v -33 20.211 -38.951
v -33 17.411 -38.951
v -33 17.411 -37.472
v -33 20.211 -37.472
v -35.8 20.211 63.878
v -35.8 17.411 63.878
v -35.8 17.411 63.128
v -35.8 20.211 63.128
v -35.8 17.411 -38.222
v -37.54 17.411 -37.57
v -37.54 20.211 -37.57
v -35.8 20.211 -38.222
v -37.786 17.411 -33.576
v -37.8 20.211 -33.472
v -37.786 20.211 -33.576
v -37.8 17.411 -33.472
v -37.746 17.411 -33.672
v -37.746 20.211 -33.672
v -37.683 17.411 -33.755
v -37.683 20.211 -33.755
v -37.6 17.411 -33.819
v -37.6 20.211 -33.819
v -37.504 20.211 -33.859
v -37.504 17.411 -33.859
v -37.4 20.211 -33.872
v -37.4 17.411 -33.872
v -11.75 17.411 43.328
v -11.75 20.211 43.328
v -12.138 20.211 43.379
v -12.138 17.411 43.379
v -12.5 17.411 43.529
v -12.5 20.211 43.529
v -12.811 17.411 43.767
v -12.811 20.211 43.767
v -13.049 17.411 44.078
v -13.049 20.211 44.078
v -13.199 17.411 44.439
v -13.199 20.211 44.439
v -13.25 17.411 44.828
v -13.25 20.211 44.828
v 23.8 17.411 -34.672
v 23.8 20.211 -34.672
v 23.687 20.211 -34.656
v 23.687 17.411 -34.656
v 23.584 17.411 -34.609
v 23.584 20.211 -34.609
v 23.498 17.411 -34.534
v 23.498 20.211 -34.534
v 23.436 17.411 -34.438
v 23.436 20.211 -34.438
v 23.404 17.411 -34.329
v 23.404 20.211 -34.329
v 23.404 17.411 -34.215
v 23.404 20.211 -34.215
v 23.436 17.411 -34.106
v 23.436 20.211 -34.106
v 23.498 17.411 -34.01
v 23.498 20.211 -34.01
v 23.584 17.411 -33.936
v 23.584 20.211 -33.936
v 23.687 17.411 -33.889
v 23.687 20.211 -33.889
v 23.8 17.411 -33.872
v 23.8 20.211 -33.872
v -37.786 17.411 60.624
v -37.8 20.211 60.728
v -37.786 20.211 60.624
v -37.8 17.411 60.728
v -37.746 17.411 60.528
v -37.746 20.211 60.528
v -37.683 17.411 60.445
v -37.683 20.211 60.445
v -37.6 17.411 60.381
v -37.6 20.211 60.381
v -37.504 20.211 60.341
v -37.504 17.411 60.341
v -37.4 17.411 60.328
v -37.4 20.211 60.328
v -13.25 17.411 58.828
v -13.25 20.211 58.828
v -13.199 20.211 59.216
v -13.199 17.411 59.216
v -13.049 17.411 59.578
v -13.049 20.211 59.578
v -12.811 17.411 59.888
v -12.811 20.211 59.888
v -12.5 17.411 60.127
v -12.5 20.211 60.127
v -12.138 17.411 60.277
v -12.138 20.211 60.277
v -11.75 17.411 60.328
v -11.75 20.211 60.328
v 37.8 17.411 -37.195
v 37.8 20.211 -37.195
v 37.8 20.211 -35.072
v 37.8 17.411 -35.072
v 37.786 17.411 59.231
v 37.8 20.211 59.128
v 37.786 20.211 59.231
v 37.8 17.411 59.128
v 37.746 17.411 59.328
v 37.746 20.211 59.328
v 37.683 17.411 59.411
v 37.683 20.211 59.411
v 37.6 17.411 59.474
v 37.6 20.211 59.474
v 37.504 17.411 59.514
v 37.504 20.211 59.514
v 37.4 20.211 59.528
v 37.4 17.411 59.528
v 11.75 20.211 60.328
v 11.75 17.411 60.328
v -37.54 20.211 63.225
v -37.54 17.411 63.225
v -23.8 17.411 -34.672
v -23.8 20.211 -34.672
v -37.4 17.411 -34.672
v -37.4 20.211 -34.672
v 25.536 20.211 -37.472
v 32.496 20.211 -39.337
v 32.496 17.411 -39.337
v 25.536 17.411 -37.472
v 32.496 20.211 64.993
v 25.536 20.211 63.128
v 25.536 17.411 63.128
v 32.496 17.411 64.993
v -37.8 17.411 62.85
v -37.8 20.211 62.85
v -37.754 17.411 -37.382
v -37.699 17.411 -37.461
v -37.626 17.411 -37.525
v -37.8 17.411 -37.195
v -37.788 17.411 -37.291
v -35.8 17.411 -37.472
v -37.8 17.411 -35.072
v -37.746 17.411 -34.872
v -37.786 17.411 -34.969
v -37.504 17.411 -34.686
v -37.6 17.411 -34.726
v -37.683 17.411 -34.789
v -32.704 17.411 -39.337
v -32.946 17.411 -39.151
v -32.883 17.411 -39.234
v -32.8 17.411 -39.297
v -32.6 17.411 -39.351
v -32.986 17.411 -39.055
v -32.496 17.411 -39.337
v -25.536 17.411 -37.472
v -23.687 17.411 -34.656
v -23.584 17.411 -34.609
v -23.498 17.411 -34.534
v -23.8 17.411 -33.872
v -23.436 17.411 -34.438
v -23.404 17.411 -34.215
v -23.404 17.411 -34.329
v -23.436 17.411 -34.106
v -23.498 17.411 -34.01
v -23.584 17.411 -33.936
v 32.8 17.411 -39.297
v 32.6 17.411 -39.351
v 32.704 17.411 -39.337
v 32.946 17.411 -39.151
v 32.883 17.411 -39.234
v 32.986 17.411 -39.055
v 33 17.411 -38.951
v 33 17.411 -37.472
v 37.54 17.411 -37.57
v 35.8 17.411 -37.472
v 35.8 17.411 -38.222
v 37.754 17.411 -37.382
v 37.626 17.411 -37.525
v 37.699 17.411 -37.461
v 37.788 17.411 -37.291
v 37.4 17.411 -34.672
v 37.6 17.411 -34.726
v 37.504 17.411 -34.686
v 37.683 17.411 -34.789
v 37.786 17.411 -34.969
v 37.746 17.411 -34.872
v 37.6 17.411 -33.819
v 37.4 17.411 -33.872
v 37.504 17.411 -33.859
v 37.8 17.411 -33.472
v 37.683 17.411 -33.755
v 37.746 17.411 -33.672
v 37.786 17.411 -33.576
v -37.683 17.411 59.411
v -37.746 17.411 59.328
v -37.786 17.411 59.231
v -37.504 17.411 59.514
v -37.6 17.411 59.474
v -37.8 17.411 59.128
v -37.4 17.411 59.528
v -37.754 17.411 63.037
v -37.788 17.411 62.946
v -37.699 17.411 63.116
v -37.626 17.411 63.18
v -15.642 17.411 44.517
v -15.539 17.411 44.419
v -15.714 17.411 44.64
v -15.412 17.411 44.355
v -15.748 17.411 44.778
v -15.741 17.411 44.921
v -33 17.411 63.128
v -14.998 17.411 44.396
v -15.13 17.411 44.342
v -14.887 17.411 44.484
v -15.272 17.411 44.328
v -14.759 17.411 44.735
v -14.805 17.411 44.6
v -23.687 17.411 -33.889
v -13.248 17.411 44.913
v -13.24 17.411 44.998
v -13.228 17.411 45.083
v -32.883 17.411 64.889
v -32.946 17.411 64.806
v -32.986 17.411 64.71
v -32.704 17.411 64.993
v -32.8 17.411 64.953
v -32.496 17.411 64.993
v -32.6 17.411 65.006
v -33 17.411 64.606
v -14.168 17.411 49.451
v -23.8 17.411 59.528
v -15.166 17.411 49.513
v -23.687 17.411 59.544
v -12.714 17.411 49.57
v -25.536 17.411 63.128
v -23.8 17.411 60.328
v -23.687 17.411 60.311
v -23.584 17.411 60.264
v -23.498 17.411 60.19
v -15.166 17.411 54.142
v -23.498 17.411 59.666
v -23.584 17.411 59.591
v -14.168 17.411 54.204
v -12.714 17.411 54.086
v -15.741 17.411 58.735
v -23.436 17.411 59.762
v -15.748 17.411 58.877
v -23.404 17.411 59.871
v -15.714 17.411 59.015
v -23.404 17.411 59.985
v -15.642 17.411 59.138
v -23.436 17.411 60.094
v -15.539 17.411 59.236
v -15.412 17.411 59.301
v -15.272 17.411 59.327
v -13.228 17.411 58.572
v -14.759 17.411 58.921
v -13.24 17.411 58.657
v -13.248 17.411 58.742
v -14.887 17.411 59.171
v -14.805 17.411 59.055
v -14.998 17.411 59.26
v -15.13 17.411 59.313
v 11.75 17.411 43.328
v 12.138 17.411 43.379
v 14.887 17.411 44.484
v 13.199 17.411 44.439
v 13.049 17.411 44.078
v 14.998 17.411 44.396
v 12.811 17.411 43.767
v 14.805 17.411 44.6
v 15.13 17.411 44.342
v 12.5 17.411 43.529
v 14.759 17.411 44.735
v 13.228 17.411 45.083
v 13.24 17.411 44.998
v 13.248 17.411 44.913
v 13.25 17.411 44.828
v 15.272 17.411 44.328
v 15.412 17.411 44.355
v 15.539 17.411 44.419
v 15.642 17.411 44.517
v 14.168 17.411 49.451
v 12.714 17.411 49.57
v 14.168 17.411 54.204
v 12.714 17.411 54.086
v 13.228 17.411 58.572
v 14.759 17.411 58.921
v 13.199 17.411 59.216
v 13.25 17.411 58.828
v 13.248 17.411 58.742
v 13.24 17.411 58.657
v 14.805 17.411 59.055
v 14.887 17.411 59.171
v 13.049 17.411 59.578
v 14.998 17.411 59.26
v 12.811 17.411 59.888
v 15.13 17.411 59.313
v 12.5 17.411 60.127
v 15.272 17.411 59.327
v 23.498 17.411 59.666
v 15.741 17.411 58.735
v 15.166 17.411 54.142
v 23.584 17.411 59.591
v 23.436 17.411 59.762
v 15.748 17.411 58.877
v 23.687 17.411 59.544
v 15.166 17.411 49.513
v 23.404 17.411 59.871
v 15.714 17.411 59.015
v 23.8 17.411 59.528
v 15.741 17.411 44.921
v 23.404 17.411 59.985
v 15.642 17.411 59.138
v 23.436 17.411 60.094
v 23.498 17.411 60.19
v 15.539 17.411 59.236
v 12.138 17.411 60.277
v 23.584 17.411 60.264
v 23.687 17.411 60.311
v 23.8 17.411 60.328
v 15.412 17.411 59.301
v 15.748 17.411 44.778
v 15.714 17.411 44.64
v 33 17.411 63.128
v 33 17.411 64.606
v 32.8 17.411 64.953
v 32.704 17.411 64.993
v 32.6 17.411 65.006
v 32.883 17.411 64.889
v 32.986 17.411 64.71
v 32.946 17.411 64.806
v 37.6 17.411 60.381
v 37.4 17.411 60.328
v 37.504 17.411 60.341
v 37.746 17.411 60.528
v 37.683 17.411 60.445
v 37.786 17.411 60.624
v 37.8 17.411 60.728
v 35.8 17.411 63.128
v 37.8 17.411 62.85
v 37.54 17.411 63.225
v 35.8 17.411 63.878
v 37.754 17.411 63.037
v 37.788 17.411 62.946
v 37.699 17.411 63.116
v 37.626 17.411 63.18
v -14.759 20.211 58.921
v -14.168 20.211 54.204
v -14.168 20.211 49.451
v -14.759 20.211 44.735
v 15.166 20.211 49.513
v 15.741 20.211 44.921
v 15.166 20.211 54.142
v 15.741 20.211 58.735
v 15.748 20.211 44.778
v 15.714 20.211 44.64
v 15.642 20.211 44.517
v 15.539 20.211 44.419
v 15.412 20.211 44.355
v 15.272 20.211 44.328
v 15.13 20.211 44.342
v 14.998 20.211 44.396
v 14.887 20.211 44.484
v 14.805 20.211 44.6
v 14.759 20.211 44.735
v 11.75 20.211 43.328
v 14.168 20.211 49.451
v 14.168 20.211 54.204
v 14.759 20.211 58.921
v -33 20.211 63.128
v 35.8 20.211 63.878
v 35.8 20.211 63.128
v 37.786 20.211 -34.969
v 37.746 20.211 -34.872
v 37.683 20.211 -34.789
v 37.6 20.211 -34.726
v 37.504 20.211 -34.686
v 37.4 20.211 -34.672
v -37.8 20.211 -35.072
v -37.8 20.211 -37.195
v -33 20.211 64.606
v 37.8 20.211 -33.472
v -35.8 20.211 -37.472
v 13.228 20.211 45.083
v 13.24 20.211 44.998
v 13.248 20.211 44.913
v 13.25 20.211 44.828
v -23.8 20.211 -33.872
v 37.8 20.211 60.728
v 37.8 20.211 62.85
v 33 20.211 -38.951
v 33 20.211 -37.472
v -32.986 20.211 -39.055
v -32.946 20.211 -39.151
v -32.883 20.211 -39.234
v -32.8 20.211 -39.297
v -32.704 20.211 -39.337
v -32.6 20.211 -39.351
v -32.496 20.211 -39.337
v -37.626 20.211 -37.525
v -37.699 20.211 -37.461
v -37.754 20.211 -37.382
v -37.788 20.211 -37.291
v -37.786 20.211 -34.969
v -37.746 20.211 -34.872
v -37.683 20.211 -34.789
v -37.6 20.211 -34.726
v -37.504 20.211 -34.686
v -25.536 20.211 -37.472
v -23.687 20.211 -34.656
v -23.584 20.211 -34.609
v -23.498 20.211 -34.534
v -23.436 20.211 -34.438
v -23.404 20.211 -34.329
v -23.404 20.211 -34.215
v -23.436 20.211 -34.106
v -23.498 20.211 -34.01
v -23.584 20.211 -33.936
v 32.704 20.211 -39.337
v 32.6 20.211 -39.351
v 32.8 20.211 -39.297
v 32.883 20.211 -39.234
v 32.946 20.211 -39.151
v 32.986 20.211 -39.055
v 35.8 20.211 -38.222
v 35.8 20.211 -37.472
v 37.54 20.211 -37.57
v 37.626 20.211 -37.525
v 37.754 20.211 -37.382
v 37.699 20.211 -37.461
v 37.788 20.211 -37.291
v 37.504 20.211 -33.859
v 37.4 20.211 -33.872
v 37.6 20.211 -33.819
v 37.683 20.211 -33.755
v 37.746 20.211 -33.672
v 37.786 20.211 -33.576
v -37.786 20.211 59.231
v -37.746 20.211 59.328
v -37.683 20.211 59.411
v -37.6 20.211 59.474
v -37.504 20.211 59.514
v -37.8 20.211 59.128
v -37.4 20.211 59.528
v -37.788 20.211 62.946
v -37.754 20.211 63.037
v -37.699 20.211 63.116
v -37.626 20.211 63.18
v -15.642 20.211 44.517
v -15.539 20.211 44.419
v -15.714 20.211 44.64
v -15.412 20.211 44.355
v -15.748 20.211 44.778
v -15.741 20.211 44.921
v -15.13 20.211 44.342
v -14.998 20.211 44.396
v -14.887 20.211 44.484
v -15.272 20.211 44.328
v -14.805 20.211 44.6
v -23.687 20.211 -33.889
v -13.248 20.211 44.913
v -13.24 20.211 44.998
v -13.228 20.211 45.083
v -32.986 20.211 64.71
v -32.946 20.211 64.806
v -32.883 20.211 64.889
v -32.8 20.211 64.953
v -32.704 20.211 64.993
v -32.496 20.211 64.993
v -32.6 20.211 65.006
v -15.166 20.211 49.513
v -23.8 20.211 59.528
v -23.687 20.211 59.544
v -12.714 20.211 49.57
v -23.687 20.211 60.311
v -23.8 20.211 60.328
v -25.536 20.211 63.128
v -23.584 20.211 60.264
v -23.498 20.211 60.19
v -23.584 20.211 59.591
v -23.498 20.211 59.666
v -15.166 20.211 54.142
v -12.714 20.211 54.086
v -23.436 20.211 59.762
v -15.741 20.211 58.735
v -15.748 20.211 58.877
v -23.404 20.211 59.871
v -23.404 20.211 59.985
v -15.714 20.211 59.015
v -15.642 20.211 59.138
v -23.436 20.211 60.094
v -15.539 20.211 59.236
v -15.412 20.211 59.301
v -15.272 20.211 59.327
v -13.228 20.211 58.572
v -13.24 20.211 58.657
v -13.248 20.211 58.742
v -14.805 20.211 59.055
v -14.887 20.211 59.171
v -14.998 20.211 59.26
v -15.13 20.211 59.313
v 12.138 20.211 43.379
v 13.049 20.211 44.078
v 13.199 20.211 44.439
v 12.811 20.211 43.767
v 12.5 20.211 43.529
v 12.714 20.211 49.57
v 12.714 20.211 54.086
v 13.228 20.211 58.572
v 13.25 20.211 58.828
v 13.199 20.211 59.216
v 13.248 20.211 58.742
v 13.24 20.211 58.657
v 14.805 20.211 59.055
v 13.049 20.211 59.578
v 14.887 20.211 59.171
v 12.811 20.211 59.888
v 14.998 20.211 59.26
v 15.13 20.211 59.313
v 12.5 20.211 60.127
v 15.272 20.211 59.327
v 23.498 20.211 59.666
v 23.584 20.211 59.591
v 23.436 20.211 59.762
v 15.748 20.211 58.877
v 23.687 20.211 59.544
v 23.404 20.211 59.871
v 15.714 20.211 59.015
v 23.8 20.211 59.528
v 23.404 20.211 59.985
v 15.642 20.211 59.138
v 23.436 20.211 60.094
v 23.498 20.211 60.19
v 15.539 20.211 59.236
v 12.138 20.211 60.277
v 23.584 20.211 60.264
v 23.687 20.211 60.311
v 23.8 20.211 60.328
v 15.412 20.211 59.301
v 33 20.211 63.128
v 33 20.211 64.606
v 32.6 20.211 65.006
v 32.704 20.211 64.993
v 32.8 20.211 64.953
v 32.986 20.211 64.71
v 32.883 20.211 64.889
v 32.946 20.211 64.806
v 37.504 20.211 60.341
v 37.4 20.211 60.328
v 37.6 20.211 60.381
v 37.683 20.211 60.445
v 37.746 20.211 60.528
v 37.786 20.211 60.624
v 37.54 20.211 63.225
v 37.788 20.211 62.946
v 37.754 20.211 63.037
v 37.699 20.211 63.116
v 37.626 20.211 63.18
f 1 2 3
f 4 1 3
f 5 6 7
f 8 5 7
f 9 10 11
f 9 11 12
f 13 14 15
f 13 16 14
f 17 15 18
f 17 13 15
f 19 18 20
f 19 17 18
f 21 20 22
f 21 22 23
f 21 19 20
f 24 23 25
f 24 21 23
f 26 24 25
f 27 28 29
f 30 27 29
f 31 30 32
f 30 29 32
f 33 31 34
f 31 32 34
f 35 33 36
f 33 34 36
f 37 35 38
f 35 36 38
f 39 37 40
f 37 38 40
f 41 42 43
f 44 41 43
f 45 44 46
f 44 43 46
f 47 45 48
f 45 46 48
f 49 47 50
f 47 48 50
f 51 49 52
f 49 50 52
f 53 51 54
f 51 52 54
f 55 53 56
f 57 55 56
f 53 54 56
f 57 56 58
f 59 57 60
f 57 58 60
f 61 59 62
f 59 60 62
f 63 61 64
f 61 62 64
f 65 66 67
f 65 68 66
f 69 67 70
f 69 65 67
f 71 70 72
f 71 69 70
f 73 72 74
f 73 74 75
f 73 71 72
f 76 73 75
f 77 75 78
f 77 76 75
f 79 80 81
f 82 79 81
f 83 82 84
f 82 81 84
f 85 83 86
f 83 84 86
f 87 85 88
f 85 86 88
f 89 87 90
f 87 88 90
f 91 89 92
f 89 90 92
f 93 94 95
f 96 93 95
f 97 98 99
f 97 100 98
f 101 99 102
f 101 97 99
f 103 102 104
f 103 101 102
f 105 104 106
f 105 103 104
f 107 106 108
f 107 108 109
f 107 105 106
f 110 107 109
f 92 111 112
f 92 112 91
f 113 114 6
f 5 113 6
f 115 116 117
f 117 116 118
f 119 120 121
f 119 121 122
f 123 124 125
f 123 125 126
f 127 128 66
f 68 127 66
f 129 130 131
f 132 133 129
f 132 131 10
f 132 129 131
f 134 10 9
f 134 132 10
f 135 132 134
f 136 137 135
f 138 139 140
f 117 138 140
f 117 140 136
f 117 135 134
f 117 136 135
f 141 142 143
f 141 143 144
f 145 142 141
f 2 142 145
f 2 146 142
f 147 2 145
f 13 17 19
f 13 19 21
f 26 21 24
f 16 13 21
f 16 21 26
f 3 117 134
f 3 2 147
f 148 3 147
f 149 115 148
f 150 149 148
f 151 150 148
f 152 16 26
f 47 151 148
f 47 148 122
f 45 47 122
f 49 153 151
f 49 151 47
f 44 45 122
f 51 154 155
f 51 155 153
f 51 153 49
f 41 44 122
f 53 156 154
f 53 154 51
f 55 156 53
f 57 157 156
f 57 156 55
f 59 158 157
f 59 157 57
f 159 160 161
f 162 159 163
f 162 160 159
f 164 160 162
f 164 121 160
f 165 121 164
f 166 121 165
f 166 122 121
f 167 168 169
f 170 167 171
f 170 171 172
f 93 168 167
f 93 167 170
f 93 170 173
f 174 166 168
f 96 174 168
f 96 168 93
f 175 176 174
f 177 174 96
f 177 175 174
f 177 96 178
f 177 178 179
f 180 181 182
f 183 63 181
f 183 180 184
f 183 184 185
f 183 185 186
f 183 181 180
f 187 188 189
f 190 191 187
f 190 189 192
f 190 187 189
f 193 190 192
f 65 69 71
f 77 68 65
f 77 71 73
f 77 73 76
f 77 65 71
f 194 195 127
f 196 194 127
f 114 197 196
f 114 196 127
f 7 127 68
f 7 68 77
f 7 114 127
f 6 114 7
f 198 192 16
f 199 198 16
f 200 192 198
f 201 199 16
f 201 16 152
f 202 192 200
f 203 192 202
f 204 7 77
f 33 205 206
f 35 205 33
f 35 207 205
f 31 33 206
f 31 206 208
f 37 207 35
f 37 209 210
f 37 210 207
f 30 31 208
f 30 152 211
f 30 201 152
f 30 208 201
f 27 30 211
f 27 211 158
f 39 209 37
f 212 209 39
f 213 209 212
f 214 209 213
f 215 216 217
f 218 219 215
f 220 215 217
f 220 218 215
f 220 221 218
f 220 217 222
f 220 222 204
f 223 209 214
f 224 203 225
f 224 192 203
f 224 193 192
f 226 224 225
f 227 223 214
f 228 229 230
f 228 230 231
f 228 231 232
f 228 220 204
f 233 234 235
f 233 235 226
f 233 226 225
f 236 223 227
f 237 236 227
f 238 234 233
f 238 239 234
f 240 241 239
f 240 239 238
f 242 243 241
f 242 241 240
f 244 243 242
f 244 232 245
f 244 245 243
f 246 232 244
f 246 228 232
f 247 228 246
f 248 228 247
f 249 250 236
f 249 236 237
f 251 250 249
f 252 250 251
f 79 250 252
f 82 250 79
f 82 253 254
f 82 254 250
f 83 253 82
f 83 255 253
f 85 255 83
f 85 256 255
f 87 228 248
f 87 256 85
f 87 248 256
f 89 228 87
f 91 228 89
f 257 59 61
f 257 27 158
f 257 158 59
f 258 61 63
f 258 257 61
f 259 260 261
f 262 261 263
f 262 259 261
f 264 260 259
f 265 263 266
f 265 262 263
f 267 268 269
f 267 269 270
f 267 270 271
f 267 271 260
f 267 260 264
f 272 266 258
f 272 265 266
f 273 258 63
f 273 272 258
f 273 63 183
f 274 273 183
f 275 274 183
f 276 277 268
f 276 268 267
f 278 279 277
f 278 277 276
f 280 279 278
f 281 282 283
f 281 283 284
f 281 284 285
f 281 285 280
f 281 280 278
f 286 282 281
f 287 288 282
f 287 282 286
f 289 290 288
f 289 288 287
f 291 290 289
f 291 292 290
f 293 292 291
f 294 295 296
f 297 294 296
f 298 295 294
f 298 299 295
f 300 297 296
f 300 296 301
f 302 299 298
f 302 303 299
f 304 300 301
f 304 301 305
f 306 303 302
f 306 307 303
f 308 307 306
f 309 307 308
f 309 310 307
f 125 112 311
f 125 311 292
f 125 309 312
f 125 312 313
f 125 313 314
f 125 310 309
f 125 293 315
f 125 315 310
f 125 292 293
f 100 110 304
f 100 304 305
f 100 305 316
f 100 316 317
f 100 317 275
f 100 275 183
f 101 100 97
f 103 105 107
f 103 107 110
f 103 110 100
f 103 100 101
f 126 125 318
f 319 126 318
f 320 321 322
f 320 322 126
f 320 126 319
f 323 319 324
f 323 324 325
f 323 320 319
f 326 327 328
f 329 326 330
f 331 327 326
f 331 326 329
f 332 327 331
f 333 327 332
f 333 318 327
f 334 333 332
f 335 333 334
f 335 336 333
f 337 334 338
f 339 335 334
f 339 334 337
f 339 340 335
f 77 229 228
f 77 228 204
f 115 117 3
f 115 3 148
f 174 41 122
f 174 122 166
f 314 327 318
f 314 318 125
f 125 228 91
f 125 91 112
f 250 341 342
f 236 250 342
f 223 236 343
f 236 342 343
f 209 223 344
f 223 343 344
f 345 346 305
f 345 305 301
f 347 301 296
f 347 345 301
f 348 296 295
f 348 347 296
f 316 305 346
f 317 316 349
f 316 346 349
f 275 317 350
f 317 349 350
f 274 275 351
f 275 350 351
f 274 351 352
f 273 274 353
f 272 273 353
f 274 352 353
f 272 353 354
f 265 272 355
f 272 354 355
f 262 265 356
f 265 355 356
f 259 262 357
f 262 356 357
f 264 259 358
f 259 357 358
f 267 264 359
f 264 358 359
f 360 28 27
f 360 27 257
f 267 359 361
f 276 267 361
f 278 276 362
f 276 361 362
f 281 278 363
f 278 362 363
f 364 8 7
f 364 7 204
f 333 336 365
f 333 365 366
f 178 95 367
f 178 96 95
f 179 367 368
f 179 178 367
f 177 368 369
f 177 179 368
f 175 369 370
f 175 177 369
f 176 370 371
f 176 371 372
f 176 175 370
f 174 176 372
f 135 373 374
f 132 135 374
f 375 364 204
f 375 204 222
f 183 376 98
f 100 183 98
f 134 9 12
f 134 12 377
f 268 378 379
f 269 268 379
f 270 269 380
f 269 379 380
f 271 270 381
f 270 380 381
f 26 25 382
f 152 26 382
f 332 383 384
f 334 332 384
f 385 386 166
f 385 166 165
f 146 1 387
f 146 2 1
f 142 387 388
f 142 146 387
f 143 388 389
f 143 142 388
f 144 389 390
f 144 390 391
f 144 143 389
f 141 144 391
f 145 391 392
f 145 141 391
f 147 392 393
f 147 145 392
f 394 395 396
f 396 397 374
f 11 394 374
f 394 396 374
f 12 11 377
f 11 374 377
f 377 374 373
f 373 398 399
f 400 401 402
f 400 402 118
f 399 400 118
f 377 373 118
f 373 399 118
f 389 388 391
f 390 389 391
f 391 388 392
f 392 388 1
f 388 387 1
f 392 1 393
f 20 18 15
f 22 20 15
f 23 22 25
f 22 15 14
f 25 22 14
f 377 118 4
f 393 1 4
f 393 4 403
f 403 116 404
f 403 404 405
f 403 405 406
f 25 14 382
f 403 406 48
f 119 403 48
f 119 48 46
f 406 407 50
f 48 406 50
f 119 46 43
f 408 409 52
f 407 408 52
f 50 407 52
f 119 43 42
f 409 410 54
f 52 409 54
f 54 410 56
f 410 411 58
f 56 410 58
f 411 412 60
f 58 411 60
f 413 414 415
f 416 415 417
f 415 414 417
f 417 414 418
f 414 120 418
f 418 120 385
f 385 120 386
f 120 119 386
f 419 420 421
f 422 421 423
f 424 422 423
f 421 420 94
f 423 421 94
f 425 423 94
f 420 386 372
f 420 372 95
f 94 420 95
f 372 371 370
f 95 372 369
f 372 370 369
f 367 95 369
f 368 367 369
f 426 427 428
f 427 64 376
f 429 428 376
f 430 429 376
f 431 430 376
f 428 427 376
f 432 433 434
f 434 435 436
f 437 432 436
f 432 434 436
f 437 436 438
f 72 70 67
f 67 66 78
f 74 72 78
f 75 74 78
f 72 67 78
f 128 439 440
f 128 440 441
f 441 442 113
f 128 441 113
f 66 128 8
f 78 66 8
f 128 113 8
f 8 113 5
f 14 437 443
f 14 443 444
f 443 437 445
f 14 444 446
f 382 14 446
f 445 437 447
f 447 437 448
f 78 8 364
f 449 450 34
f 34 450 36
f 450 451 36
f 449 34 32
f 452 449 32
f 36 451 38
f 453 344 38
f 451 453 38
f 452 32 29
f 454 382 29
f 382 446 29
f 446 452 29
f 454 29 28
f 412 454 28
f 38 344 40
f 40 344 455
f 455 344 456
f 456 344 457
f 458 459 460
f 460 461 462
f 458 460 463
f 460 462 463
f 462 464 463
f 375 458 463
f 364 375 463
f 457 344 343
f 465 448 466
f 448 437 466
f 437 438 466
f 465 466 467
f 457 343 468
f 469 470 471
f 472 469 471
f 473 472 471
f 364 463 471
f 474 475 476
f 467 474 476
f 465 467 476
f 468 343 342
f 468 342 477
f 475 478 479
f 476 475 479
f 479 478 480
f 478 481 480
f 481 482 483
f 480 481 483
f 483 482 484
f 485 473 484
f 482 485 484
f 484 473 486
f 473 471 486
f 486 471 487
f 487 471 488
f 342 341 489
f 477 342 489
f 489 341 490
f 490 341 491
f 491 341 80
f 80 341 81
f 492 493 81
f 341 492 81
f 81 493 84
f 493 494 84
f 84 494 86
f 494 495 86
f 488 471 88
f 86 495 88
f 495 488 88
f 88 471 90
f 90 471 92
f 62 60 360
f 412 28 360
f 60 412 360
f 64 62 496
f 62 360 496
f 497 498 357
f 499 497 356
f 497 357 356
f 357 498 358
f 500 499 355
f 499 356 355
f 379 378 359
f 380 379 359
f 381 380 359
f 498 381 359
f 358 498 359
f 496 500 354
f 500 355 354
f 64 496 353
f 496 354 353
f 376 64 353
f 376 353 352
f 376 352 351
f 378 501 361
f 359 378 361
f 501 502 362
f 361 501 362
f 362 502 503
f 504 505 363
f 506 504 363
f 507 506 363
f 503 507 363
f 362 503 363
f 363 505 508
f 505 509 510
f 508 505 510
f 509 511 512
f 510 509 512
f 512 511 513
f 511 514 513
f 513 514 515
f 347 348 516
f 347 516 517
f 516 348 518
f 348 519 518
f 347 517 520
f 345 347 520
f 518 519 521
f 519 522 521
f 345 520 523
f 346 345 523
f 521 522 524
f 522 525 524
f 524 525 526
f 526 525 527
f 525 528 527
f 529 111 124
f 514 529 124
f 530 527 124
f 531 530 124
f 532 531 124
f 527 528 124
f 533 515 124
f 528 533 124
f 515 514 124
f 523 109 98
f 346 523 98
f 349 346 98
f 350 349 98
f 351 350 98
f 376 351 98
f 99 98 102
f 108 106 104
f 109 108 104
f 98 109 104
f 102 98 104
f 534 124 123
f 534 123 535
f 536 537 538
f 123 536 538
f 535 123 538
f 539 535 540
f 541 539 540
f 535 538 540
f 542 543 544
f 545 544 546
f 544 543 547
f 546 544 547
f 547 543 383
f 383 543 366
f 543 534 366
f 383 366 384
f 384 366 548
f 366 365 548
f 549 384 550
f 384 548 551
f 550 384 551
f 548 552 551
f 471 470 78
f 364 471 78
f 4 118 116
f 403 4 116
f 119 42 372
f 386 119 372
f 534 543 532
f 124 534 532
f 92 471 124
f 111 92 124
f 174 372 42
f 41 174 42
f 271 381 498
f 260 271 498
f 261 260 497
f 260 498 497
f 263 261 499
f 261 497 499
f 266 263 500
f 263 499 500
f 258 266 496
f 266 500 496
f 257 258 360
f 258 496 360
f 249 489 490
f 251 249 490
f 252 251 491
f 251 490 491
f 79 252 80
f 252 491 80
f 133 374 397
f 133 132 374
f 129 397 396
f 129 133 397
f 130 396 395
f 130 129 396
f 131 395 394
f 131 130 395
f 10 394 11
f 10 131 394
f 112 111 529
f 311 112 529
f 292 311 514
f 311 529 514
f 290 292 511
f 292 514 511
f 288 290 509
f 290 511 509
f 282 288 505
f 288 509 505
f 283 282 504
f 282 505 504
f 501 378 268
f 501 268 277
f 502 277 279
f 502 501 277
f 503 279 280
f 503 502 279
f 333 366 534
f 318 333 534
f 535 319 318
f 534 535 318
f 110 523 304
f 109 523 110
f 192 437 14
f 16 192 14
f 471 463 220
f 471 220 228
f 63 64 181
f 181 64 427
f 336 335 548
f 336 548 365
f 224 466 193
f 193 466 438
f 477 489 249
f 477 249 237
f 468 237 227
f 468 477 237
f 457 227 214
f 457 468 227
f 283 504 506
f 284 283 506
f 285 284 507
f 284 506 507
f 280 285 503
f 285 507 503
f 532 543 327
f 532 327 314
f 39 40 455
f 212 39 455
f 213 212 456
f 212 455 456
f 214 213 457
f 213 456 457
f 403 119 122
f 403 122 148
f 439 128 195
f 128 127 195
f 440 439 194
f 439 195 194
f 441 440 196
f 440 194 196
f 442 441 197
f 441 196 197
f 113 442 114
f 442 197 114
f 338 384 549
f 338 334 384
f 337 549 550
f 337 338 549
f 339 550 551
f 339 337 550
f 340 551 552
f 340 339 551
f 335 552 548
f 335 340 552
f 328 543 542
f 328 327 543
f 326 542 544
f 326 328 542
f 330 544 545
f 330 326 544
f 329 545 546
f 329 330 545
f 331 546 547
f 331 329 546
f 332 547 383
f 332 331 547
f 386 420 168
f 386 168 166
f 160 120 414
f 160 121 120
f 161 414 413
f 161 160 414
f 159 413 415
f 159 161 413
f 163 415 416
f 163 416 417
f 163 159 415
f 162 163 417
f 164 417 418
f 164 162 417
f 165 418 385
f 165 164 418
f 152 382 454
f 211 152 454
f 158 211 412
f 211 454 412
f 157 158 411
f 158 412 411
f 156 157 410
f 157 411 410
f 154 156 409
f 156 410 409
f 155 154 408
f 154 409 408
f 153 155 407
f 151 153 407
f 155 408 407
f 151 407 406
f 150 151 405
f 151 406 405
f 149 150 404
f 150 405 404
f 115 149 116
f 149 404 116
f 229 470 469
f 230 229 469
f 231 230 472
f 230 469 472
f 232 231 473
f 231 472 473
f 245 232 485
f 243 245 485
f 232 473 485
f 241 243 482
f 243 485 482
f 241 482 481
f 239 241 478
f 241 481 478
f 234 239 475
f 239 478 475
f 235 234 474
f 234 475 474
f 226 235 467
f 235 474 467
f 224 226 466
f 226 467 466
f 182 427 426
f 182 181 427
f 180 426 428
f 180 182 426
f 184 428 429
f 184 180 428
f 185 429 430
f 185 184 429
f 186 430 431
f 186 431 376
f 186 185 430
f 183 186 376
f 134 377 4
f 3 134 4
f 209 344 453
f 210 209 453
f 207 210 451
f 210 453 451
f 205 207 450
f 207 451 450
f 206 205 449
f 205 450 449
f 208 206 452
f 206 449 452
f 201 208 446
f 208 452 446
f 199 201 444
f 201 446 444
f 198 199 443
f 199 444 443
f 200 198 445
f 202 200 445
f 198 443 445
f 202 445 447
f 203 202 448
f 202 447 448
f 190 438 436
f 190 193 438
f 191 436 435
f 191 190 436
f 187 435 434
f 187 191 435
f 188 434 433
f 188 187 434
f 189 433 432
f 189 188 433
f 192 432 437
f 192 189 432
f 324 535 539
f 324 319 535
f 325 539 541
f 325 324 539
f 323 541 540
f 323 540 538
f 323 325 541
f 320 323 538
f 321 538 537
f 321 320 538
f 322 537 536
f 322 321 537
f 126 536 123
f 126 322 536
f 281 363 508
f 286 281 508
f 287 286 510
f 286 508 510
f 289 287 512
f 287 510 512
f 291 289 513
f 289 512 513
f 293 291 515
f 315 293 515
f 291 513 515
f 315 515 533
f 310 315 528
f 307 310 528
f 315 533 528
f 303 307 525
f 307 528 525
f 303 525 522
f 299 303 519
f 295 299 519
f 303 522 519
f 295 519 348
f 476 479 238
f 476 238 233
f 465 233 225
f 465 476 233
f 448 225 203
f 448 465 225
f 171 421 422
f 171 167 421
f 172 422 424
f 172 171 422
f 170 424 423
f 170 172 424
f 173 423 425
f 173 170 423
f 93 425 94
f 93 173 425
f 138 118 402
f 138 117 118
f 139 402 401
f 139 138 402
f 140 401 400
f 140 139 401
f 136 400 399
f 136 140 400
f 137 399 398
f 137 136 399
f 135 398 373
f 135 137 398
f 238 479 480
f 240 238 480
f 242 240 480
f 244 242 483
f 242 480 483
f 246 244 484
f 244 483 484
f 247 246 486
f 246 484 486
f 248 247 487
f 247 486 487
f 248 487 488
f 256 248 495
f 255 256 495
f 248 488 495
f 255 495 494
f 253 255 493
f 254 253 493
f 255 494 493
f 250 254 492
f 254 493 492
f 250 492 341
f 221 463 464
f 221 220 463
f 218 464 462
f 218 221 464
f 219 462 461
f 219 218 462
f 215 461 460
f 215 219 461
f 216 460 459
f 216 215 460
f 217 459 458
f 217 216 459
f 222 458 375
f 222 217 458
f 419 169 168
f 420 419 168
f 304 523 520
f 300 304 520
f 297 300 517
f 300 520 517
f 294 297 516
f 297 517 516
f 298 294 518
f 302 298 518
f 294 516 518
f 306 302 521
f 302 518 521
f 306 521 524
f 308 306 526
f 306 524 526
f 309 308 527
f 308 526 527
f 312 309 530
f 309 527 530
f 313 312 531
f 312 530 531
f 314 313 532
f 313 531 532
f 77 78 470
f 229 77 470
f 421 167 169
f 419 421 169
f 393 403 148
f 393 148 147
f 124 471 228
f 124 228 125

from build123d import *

# Parameters (mm, degrees)
PAD008_DEPTH    = 2.8
FILLET001_R     = 0.4
POCKET004_DEPTH = 2.801


with BuildPart() as part:
    # Sketch008 (on Face4 of ShapeBinder007) → Pad008 (new body)
    with BuildSketch(Plane(origin=(0, 20.211282, 0), x_dir=(-1, 0, 0), z_dir=(0, 1, 0))):
        with BuildLine():
            Line((37.8, 63.127675), (37.8, 60.327675))
            Line((37.8, 60.327675), (23.8, 60.327675))
            ThreePointArc((23.8, 60.327675), (23.4, 59.927675), (23.8, 59.527675))
            Line((23.8, 59.527675), (37.8, 59.527675))
            Line((37.8, 59.527675), (37.8, -33.872325))
            Line((37.8, -33.872325), (23.8, -33.872325))
            ThreePointArc((23.8, -33.872325), (23.4, -34.272325), (23.8, -34.672325))
            Line((23.8, -34.672325), (37.8, -34.672325))
            Line((37.8, -34.672325), (37.8, -37.472325))
            Line((37.8, -37.472325), (35.8, -38.222325))
            Line((35.8, -38.222325), (35.8, -37.472325))
            Line((35.8, -37.472325), (33, -37.472325))
            Line((33, -39.472325), (33, -37.472325))
            Line((25.535898, -37.472325), (33, -39.472325))
            Line((-25.535898, -37.472325), (25.535898, -37.472325))
            Line((-33, -39.472325), (-25.535898, -37.472325))
            Line((-33, -37.472325), (-33, -39.472325))
            Line((-35.8, -37.472325), (-33, -37.472325))
            Line((-35.8, -38.222325), (-35.8, -37.472325))
            Line((-37.8, -37.472325), (-35.8, -38.222325))
            Line((-37.8, -37.472325), (-37.8, -34.672325))
            Line((-37.8, -34.672325), (-23.8, -34.672325))
            ThreePointArc((-23.8, -34.672325), (-23.4, -34.272325), (-23.8, -33.872325))
            Line((-23.8, -33.872325), (-37.8, -33.872325))
            Line((-37.8, -33.872325), (-37.8, 59.527675))
            Line((-23.8, 59.527675), (-37.8, 59.527675))
            ThreePointArc((-23.8, 59.527675), (-23.4, 59.927675), (-23.8, 60.327675))
            Line((-37.8, 60.327675), (-23.8, 60.327675))
            Line((-37.8, 60.327675), (-37.8, 63.127675))
            Line((-37.8, 63.127675), (-35.8, 63.877675))
            Line((-35.8, 63.877675), (-35.8, 63.127675))
            Line((-35.8, 63.127675), (-33, 63.127675))
            Line((-33, 65.127675), (-33, 63.127675))
            Line((-25.535898, 63.127675), (-33, 65.127675))
            Line((25.535898, 63.127675), (-25.535898, 63.127675))
            Line((33, 65.127675), (25.535898, 63.127675))
            Line((33, 63.127675), (33, 65.127675))
            Line((35.8, 63.127675), (33, 63.127675))
            Line((35.8, 63.877675), (35.8, 63.127675))
            Line((37.8, 63.127675), (35.8, 63.877675))
        make_face()
    extrude(amount=-PAD008_DEPTH)

    # Fillet001
    fillet001_edges = [part.edges().sort_by_distance(p)[0] for p in [
        (-33, 18.811282, 65.127675),
        (-37.8, 18.811282, 63.127675),
        (-37.8, 18.811282, 60.327675),
        (-37.8, 18.811282, 59.527675),
        (-37.8, 18.811282, -33.872325),
        (-37.8, 18.811282, -34.672325),
        (-37.8, 18.811282, -37.472325),
        (-33, 18.811282, -39.472325),
        (33, 18.811282, -39.472325),
        (37.8, 18.811282, -37.472325),
        (37.8, 18.811282, -34.672325),
        (37.8, 18.811282, -33.872325),
        (33, 18.811282, 65.127675),
        (37.8, 18.811282, 63.127675),
        (37.8, 18.811282, 60.327675),
        (37.8, 18.811282, 59.527675),
    ]]
    fillet(fillet001_edges, radius=FILLET001_R)

    # Sketch017 (on Face2 of Fillet001) → Pocket004 (cut, through all)
    with BuildSketch(Plane(origin=(0, 20.211282, 0), x_dir=(-1, 0, 0), z_dir=(0, 1, 0))):
        with BuildLine():
            ThreePointArc((-11.75, 60.327675), (-12.81066, 59.888335), (-13.25, 58.827675))
            ThreePointArc((-13.25, 58.827675), (-13.24452, 58.699573), (-13.22812, 58.572408))
            ThreePointArc((-13.22812, 45.082943), (-12.65, 51.827675), (-13.22812, 58.572408))
            ThreePointArc((-13.22812, 45.082943), (-13.24452, 44.955777), (-13.25, 44.827675))
            ThreePointArc((-13.25, 44.827675), (-12.81066, 43.767015), (-11.75, 43.327675))
            Line((11.75, 43.327675), (-11.75, 43.327675))
            ThreePointArc((11.75, 43.327675), (12.81066, 43.767015), (13.25, 44.827675))
            ThreePointArc((13.25, 44.827675), (13.24452, 44.955777), (13.22812, 45.082943))
            ThreePointArc((13.22812, 58.572408), (12.65, 51.827675), (13.22812, 45.082943))
            ThreePointArc((13.22812, 58.572408), (13.24452, 58.699573), (13.25, 58.827675))
            ThreePointArc((13.25, 58.827675), (12.81066, 59.888335), (11.75, 60.327675))
            Line((-11.75, 60.327675), (11.75, 60.327675))
        make_face()
        with BuildLine():
            ThreePointArc((-14.7587, 44.73481), (-14.09424, 51.827675), (-14.7587, 58.92054))
            ThreePointArc((-14.7587, 58.92054), (-15.342865, 59.318975), (-15.7413, 58.73481))
            ThreePointArc((-15.7413, 44.92054), (-15.09424, 51.827675), (-15.7413, 58.73481))
            ThreePointArc((-15.7413, 44.92054), (-15.342865, 44.336375), (-14.7587, 44.73481))
        make_face()
        with BuildLine():
            ThreePointArc((14.7587, 58.92054), (14.09424, 51.827675), (14.7587, 44.73481))
            ThreePointArc((14.7587, 44.73481), (15.342865, 44.336375), (15.7413, 44.92054))
            ThreePointArc((15.7413, 58.73481), (15.09424, 51.827675), (15.7413, 44.92054))
            ThreePointArc((15.7413, 58.73481), (15.342865, 59.318975), (14.7587, 58.92054))
        make_face()
    extrude(amount=-POCKET004_DEPTH, mode=Mode.SUBTRACT)


solid = part.part
